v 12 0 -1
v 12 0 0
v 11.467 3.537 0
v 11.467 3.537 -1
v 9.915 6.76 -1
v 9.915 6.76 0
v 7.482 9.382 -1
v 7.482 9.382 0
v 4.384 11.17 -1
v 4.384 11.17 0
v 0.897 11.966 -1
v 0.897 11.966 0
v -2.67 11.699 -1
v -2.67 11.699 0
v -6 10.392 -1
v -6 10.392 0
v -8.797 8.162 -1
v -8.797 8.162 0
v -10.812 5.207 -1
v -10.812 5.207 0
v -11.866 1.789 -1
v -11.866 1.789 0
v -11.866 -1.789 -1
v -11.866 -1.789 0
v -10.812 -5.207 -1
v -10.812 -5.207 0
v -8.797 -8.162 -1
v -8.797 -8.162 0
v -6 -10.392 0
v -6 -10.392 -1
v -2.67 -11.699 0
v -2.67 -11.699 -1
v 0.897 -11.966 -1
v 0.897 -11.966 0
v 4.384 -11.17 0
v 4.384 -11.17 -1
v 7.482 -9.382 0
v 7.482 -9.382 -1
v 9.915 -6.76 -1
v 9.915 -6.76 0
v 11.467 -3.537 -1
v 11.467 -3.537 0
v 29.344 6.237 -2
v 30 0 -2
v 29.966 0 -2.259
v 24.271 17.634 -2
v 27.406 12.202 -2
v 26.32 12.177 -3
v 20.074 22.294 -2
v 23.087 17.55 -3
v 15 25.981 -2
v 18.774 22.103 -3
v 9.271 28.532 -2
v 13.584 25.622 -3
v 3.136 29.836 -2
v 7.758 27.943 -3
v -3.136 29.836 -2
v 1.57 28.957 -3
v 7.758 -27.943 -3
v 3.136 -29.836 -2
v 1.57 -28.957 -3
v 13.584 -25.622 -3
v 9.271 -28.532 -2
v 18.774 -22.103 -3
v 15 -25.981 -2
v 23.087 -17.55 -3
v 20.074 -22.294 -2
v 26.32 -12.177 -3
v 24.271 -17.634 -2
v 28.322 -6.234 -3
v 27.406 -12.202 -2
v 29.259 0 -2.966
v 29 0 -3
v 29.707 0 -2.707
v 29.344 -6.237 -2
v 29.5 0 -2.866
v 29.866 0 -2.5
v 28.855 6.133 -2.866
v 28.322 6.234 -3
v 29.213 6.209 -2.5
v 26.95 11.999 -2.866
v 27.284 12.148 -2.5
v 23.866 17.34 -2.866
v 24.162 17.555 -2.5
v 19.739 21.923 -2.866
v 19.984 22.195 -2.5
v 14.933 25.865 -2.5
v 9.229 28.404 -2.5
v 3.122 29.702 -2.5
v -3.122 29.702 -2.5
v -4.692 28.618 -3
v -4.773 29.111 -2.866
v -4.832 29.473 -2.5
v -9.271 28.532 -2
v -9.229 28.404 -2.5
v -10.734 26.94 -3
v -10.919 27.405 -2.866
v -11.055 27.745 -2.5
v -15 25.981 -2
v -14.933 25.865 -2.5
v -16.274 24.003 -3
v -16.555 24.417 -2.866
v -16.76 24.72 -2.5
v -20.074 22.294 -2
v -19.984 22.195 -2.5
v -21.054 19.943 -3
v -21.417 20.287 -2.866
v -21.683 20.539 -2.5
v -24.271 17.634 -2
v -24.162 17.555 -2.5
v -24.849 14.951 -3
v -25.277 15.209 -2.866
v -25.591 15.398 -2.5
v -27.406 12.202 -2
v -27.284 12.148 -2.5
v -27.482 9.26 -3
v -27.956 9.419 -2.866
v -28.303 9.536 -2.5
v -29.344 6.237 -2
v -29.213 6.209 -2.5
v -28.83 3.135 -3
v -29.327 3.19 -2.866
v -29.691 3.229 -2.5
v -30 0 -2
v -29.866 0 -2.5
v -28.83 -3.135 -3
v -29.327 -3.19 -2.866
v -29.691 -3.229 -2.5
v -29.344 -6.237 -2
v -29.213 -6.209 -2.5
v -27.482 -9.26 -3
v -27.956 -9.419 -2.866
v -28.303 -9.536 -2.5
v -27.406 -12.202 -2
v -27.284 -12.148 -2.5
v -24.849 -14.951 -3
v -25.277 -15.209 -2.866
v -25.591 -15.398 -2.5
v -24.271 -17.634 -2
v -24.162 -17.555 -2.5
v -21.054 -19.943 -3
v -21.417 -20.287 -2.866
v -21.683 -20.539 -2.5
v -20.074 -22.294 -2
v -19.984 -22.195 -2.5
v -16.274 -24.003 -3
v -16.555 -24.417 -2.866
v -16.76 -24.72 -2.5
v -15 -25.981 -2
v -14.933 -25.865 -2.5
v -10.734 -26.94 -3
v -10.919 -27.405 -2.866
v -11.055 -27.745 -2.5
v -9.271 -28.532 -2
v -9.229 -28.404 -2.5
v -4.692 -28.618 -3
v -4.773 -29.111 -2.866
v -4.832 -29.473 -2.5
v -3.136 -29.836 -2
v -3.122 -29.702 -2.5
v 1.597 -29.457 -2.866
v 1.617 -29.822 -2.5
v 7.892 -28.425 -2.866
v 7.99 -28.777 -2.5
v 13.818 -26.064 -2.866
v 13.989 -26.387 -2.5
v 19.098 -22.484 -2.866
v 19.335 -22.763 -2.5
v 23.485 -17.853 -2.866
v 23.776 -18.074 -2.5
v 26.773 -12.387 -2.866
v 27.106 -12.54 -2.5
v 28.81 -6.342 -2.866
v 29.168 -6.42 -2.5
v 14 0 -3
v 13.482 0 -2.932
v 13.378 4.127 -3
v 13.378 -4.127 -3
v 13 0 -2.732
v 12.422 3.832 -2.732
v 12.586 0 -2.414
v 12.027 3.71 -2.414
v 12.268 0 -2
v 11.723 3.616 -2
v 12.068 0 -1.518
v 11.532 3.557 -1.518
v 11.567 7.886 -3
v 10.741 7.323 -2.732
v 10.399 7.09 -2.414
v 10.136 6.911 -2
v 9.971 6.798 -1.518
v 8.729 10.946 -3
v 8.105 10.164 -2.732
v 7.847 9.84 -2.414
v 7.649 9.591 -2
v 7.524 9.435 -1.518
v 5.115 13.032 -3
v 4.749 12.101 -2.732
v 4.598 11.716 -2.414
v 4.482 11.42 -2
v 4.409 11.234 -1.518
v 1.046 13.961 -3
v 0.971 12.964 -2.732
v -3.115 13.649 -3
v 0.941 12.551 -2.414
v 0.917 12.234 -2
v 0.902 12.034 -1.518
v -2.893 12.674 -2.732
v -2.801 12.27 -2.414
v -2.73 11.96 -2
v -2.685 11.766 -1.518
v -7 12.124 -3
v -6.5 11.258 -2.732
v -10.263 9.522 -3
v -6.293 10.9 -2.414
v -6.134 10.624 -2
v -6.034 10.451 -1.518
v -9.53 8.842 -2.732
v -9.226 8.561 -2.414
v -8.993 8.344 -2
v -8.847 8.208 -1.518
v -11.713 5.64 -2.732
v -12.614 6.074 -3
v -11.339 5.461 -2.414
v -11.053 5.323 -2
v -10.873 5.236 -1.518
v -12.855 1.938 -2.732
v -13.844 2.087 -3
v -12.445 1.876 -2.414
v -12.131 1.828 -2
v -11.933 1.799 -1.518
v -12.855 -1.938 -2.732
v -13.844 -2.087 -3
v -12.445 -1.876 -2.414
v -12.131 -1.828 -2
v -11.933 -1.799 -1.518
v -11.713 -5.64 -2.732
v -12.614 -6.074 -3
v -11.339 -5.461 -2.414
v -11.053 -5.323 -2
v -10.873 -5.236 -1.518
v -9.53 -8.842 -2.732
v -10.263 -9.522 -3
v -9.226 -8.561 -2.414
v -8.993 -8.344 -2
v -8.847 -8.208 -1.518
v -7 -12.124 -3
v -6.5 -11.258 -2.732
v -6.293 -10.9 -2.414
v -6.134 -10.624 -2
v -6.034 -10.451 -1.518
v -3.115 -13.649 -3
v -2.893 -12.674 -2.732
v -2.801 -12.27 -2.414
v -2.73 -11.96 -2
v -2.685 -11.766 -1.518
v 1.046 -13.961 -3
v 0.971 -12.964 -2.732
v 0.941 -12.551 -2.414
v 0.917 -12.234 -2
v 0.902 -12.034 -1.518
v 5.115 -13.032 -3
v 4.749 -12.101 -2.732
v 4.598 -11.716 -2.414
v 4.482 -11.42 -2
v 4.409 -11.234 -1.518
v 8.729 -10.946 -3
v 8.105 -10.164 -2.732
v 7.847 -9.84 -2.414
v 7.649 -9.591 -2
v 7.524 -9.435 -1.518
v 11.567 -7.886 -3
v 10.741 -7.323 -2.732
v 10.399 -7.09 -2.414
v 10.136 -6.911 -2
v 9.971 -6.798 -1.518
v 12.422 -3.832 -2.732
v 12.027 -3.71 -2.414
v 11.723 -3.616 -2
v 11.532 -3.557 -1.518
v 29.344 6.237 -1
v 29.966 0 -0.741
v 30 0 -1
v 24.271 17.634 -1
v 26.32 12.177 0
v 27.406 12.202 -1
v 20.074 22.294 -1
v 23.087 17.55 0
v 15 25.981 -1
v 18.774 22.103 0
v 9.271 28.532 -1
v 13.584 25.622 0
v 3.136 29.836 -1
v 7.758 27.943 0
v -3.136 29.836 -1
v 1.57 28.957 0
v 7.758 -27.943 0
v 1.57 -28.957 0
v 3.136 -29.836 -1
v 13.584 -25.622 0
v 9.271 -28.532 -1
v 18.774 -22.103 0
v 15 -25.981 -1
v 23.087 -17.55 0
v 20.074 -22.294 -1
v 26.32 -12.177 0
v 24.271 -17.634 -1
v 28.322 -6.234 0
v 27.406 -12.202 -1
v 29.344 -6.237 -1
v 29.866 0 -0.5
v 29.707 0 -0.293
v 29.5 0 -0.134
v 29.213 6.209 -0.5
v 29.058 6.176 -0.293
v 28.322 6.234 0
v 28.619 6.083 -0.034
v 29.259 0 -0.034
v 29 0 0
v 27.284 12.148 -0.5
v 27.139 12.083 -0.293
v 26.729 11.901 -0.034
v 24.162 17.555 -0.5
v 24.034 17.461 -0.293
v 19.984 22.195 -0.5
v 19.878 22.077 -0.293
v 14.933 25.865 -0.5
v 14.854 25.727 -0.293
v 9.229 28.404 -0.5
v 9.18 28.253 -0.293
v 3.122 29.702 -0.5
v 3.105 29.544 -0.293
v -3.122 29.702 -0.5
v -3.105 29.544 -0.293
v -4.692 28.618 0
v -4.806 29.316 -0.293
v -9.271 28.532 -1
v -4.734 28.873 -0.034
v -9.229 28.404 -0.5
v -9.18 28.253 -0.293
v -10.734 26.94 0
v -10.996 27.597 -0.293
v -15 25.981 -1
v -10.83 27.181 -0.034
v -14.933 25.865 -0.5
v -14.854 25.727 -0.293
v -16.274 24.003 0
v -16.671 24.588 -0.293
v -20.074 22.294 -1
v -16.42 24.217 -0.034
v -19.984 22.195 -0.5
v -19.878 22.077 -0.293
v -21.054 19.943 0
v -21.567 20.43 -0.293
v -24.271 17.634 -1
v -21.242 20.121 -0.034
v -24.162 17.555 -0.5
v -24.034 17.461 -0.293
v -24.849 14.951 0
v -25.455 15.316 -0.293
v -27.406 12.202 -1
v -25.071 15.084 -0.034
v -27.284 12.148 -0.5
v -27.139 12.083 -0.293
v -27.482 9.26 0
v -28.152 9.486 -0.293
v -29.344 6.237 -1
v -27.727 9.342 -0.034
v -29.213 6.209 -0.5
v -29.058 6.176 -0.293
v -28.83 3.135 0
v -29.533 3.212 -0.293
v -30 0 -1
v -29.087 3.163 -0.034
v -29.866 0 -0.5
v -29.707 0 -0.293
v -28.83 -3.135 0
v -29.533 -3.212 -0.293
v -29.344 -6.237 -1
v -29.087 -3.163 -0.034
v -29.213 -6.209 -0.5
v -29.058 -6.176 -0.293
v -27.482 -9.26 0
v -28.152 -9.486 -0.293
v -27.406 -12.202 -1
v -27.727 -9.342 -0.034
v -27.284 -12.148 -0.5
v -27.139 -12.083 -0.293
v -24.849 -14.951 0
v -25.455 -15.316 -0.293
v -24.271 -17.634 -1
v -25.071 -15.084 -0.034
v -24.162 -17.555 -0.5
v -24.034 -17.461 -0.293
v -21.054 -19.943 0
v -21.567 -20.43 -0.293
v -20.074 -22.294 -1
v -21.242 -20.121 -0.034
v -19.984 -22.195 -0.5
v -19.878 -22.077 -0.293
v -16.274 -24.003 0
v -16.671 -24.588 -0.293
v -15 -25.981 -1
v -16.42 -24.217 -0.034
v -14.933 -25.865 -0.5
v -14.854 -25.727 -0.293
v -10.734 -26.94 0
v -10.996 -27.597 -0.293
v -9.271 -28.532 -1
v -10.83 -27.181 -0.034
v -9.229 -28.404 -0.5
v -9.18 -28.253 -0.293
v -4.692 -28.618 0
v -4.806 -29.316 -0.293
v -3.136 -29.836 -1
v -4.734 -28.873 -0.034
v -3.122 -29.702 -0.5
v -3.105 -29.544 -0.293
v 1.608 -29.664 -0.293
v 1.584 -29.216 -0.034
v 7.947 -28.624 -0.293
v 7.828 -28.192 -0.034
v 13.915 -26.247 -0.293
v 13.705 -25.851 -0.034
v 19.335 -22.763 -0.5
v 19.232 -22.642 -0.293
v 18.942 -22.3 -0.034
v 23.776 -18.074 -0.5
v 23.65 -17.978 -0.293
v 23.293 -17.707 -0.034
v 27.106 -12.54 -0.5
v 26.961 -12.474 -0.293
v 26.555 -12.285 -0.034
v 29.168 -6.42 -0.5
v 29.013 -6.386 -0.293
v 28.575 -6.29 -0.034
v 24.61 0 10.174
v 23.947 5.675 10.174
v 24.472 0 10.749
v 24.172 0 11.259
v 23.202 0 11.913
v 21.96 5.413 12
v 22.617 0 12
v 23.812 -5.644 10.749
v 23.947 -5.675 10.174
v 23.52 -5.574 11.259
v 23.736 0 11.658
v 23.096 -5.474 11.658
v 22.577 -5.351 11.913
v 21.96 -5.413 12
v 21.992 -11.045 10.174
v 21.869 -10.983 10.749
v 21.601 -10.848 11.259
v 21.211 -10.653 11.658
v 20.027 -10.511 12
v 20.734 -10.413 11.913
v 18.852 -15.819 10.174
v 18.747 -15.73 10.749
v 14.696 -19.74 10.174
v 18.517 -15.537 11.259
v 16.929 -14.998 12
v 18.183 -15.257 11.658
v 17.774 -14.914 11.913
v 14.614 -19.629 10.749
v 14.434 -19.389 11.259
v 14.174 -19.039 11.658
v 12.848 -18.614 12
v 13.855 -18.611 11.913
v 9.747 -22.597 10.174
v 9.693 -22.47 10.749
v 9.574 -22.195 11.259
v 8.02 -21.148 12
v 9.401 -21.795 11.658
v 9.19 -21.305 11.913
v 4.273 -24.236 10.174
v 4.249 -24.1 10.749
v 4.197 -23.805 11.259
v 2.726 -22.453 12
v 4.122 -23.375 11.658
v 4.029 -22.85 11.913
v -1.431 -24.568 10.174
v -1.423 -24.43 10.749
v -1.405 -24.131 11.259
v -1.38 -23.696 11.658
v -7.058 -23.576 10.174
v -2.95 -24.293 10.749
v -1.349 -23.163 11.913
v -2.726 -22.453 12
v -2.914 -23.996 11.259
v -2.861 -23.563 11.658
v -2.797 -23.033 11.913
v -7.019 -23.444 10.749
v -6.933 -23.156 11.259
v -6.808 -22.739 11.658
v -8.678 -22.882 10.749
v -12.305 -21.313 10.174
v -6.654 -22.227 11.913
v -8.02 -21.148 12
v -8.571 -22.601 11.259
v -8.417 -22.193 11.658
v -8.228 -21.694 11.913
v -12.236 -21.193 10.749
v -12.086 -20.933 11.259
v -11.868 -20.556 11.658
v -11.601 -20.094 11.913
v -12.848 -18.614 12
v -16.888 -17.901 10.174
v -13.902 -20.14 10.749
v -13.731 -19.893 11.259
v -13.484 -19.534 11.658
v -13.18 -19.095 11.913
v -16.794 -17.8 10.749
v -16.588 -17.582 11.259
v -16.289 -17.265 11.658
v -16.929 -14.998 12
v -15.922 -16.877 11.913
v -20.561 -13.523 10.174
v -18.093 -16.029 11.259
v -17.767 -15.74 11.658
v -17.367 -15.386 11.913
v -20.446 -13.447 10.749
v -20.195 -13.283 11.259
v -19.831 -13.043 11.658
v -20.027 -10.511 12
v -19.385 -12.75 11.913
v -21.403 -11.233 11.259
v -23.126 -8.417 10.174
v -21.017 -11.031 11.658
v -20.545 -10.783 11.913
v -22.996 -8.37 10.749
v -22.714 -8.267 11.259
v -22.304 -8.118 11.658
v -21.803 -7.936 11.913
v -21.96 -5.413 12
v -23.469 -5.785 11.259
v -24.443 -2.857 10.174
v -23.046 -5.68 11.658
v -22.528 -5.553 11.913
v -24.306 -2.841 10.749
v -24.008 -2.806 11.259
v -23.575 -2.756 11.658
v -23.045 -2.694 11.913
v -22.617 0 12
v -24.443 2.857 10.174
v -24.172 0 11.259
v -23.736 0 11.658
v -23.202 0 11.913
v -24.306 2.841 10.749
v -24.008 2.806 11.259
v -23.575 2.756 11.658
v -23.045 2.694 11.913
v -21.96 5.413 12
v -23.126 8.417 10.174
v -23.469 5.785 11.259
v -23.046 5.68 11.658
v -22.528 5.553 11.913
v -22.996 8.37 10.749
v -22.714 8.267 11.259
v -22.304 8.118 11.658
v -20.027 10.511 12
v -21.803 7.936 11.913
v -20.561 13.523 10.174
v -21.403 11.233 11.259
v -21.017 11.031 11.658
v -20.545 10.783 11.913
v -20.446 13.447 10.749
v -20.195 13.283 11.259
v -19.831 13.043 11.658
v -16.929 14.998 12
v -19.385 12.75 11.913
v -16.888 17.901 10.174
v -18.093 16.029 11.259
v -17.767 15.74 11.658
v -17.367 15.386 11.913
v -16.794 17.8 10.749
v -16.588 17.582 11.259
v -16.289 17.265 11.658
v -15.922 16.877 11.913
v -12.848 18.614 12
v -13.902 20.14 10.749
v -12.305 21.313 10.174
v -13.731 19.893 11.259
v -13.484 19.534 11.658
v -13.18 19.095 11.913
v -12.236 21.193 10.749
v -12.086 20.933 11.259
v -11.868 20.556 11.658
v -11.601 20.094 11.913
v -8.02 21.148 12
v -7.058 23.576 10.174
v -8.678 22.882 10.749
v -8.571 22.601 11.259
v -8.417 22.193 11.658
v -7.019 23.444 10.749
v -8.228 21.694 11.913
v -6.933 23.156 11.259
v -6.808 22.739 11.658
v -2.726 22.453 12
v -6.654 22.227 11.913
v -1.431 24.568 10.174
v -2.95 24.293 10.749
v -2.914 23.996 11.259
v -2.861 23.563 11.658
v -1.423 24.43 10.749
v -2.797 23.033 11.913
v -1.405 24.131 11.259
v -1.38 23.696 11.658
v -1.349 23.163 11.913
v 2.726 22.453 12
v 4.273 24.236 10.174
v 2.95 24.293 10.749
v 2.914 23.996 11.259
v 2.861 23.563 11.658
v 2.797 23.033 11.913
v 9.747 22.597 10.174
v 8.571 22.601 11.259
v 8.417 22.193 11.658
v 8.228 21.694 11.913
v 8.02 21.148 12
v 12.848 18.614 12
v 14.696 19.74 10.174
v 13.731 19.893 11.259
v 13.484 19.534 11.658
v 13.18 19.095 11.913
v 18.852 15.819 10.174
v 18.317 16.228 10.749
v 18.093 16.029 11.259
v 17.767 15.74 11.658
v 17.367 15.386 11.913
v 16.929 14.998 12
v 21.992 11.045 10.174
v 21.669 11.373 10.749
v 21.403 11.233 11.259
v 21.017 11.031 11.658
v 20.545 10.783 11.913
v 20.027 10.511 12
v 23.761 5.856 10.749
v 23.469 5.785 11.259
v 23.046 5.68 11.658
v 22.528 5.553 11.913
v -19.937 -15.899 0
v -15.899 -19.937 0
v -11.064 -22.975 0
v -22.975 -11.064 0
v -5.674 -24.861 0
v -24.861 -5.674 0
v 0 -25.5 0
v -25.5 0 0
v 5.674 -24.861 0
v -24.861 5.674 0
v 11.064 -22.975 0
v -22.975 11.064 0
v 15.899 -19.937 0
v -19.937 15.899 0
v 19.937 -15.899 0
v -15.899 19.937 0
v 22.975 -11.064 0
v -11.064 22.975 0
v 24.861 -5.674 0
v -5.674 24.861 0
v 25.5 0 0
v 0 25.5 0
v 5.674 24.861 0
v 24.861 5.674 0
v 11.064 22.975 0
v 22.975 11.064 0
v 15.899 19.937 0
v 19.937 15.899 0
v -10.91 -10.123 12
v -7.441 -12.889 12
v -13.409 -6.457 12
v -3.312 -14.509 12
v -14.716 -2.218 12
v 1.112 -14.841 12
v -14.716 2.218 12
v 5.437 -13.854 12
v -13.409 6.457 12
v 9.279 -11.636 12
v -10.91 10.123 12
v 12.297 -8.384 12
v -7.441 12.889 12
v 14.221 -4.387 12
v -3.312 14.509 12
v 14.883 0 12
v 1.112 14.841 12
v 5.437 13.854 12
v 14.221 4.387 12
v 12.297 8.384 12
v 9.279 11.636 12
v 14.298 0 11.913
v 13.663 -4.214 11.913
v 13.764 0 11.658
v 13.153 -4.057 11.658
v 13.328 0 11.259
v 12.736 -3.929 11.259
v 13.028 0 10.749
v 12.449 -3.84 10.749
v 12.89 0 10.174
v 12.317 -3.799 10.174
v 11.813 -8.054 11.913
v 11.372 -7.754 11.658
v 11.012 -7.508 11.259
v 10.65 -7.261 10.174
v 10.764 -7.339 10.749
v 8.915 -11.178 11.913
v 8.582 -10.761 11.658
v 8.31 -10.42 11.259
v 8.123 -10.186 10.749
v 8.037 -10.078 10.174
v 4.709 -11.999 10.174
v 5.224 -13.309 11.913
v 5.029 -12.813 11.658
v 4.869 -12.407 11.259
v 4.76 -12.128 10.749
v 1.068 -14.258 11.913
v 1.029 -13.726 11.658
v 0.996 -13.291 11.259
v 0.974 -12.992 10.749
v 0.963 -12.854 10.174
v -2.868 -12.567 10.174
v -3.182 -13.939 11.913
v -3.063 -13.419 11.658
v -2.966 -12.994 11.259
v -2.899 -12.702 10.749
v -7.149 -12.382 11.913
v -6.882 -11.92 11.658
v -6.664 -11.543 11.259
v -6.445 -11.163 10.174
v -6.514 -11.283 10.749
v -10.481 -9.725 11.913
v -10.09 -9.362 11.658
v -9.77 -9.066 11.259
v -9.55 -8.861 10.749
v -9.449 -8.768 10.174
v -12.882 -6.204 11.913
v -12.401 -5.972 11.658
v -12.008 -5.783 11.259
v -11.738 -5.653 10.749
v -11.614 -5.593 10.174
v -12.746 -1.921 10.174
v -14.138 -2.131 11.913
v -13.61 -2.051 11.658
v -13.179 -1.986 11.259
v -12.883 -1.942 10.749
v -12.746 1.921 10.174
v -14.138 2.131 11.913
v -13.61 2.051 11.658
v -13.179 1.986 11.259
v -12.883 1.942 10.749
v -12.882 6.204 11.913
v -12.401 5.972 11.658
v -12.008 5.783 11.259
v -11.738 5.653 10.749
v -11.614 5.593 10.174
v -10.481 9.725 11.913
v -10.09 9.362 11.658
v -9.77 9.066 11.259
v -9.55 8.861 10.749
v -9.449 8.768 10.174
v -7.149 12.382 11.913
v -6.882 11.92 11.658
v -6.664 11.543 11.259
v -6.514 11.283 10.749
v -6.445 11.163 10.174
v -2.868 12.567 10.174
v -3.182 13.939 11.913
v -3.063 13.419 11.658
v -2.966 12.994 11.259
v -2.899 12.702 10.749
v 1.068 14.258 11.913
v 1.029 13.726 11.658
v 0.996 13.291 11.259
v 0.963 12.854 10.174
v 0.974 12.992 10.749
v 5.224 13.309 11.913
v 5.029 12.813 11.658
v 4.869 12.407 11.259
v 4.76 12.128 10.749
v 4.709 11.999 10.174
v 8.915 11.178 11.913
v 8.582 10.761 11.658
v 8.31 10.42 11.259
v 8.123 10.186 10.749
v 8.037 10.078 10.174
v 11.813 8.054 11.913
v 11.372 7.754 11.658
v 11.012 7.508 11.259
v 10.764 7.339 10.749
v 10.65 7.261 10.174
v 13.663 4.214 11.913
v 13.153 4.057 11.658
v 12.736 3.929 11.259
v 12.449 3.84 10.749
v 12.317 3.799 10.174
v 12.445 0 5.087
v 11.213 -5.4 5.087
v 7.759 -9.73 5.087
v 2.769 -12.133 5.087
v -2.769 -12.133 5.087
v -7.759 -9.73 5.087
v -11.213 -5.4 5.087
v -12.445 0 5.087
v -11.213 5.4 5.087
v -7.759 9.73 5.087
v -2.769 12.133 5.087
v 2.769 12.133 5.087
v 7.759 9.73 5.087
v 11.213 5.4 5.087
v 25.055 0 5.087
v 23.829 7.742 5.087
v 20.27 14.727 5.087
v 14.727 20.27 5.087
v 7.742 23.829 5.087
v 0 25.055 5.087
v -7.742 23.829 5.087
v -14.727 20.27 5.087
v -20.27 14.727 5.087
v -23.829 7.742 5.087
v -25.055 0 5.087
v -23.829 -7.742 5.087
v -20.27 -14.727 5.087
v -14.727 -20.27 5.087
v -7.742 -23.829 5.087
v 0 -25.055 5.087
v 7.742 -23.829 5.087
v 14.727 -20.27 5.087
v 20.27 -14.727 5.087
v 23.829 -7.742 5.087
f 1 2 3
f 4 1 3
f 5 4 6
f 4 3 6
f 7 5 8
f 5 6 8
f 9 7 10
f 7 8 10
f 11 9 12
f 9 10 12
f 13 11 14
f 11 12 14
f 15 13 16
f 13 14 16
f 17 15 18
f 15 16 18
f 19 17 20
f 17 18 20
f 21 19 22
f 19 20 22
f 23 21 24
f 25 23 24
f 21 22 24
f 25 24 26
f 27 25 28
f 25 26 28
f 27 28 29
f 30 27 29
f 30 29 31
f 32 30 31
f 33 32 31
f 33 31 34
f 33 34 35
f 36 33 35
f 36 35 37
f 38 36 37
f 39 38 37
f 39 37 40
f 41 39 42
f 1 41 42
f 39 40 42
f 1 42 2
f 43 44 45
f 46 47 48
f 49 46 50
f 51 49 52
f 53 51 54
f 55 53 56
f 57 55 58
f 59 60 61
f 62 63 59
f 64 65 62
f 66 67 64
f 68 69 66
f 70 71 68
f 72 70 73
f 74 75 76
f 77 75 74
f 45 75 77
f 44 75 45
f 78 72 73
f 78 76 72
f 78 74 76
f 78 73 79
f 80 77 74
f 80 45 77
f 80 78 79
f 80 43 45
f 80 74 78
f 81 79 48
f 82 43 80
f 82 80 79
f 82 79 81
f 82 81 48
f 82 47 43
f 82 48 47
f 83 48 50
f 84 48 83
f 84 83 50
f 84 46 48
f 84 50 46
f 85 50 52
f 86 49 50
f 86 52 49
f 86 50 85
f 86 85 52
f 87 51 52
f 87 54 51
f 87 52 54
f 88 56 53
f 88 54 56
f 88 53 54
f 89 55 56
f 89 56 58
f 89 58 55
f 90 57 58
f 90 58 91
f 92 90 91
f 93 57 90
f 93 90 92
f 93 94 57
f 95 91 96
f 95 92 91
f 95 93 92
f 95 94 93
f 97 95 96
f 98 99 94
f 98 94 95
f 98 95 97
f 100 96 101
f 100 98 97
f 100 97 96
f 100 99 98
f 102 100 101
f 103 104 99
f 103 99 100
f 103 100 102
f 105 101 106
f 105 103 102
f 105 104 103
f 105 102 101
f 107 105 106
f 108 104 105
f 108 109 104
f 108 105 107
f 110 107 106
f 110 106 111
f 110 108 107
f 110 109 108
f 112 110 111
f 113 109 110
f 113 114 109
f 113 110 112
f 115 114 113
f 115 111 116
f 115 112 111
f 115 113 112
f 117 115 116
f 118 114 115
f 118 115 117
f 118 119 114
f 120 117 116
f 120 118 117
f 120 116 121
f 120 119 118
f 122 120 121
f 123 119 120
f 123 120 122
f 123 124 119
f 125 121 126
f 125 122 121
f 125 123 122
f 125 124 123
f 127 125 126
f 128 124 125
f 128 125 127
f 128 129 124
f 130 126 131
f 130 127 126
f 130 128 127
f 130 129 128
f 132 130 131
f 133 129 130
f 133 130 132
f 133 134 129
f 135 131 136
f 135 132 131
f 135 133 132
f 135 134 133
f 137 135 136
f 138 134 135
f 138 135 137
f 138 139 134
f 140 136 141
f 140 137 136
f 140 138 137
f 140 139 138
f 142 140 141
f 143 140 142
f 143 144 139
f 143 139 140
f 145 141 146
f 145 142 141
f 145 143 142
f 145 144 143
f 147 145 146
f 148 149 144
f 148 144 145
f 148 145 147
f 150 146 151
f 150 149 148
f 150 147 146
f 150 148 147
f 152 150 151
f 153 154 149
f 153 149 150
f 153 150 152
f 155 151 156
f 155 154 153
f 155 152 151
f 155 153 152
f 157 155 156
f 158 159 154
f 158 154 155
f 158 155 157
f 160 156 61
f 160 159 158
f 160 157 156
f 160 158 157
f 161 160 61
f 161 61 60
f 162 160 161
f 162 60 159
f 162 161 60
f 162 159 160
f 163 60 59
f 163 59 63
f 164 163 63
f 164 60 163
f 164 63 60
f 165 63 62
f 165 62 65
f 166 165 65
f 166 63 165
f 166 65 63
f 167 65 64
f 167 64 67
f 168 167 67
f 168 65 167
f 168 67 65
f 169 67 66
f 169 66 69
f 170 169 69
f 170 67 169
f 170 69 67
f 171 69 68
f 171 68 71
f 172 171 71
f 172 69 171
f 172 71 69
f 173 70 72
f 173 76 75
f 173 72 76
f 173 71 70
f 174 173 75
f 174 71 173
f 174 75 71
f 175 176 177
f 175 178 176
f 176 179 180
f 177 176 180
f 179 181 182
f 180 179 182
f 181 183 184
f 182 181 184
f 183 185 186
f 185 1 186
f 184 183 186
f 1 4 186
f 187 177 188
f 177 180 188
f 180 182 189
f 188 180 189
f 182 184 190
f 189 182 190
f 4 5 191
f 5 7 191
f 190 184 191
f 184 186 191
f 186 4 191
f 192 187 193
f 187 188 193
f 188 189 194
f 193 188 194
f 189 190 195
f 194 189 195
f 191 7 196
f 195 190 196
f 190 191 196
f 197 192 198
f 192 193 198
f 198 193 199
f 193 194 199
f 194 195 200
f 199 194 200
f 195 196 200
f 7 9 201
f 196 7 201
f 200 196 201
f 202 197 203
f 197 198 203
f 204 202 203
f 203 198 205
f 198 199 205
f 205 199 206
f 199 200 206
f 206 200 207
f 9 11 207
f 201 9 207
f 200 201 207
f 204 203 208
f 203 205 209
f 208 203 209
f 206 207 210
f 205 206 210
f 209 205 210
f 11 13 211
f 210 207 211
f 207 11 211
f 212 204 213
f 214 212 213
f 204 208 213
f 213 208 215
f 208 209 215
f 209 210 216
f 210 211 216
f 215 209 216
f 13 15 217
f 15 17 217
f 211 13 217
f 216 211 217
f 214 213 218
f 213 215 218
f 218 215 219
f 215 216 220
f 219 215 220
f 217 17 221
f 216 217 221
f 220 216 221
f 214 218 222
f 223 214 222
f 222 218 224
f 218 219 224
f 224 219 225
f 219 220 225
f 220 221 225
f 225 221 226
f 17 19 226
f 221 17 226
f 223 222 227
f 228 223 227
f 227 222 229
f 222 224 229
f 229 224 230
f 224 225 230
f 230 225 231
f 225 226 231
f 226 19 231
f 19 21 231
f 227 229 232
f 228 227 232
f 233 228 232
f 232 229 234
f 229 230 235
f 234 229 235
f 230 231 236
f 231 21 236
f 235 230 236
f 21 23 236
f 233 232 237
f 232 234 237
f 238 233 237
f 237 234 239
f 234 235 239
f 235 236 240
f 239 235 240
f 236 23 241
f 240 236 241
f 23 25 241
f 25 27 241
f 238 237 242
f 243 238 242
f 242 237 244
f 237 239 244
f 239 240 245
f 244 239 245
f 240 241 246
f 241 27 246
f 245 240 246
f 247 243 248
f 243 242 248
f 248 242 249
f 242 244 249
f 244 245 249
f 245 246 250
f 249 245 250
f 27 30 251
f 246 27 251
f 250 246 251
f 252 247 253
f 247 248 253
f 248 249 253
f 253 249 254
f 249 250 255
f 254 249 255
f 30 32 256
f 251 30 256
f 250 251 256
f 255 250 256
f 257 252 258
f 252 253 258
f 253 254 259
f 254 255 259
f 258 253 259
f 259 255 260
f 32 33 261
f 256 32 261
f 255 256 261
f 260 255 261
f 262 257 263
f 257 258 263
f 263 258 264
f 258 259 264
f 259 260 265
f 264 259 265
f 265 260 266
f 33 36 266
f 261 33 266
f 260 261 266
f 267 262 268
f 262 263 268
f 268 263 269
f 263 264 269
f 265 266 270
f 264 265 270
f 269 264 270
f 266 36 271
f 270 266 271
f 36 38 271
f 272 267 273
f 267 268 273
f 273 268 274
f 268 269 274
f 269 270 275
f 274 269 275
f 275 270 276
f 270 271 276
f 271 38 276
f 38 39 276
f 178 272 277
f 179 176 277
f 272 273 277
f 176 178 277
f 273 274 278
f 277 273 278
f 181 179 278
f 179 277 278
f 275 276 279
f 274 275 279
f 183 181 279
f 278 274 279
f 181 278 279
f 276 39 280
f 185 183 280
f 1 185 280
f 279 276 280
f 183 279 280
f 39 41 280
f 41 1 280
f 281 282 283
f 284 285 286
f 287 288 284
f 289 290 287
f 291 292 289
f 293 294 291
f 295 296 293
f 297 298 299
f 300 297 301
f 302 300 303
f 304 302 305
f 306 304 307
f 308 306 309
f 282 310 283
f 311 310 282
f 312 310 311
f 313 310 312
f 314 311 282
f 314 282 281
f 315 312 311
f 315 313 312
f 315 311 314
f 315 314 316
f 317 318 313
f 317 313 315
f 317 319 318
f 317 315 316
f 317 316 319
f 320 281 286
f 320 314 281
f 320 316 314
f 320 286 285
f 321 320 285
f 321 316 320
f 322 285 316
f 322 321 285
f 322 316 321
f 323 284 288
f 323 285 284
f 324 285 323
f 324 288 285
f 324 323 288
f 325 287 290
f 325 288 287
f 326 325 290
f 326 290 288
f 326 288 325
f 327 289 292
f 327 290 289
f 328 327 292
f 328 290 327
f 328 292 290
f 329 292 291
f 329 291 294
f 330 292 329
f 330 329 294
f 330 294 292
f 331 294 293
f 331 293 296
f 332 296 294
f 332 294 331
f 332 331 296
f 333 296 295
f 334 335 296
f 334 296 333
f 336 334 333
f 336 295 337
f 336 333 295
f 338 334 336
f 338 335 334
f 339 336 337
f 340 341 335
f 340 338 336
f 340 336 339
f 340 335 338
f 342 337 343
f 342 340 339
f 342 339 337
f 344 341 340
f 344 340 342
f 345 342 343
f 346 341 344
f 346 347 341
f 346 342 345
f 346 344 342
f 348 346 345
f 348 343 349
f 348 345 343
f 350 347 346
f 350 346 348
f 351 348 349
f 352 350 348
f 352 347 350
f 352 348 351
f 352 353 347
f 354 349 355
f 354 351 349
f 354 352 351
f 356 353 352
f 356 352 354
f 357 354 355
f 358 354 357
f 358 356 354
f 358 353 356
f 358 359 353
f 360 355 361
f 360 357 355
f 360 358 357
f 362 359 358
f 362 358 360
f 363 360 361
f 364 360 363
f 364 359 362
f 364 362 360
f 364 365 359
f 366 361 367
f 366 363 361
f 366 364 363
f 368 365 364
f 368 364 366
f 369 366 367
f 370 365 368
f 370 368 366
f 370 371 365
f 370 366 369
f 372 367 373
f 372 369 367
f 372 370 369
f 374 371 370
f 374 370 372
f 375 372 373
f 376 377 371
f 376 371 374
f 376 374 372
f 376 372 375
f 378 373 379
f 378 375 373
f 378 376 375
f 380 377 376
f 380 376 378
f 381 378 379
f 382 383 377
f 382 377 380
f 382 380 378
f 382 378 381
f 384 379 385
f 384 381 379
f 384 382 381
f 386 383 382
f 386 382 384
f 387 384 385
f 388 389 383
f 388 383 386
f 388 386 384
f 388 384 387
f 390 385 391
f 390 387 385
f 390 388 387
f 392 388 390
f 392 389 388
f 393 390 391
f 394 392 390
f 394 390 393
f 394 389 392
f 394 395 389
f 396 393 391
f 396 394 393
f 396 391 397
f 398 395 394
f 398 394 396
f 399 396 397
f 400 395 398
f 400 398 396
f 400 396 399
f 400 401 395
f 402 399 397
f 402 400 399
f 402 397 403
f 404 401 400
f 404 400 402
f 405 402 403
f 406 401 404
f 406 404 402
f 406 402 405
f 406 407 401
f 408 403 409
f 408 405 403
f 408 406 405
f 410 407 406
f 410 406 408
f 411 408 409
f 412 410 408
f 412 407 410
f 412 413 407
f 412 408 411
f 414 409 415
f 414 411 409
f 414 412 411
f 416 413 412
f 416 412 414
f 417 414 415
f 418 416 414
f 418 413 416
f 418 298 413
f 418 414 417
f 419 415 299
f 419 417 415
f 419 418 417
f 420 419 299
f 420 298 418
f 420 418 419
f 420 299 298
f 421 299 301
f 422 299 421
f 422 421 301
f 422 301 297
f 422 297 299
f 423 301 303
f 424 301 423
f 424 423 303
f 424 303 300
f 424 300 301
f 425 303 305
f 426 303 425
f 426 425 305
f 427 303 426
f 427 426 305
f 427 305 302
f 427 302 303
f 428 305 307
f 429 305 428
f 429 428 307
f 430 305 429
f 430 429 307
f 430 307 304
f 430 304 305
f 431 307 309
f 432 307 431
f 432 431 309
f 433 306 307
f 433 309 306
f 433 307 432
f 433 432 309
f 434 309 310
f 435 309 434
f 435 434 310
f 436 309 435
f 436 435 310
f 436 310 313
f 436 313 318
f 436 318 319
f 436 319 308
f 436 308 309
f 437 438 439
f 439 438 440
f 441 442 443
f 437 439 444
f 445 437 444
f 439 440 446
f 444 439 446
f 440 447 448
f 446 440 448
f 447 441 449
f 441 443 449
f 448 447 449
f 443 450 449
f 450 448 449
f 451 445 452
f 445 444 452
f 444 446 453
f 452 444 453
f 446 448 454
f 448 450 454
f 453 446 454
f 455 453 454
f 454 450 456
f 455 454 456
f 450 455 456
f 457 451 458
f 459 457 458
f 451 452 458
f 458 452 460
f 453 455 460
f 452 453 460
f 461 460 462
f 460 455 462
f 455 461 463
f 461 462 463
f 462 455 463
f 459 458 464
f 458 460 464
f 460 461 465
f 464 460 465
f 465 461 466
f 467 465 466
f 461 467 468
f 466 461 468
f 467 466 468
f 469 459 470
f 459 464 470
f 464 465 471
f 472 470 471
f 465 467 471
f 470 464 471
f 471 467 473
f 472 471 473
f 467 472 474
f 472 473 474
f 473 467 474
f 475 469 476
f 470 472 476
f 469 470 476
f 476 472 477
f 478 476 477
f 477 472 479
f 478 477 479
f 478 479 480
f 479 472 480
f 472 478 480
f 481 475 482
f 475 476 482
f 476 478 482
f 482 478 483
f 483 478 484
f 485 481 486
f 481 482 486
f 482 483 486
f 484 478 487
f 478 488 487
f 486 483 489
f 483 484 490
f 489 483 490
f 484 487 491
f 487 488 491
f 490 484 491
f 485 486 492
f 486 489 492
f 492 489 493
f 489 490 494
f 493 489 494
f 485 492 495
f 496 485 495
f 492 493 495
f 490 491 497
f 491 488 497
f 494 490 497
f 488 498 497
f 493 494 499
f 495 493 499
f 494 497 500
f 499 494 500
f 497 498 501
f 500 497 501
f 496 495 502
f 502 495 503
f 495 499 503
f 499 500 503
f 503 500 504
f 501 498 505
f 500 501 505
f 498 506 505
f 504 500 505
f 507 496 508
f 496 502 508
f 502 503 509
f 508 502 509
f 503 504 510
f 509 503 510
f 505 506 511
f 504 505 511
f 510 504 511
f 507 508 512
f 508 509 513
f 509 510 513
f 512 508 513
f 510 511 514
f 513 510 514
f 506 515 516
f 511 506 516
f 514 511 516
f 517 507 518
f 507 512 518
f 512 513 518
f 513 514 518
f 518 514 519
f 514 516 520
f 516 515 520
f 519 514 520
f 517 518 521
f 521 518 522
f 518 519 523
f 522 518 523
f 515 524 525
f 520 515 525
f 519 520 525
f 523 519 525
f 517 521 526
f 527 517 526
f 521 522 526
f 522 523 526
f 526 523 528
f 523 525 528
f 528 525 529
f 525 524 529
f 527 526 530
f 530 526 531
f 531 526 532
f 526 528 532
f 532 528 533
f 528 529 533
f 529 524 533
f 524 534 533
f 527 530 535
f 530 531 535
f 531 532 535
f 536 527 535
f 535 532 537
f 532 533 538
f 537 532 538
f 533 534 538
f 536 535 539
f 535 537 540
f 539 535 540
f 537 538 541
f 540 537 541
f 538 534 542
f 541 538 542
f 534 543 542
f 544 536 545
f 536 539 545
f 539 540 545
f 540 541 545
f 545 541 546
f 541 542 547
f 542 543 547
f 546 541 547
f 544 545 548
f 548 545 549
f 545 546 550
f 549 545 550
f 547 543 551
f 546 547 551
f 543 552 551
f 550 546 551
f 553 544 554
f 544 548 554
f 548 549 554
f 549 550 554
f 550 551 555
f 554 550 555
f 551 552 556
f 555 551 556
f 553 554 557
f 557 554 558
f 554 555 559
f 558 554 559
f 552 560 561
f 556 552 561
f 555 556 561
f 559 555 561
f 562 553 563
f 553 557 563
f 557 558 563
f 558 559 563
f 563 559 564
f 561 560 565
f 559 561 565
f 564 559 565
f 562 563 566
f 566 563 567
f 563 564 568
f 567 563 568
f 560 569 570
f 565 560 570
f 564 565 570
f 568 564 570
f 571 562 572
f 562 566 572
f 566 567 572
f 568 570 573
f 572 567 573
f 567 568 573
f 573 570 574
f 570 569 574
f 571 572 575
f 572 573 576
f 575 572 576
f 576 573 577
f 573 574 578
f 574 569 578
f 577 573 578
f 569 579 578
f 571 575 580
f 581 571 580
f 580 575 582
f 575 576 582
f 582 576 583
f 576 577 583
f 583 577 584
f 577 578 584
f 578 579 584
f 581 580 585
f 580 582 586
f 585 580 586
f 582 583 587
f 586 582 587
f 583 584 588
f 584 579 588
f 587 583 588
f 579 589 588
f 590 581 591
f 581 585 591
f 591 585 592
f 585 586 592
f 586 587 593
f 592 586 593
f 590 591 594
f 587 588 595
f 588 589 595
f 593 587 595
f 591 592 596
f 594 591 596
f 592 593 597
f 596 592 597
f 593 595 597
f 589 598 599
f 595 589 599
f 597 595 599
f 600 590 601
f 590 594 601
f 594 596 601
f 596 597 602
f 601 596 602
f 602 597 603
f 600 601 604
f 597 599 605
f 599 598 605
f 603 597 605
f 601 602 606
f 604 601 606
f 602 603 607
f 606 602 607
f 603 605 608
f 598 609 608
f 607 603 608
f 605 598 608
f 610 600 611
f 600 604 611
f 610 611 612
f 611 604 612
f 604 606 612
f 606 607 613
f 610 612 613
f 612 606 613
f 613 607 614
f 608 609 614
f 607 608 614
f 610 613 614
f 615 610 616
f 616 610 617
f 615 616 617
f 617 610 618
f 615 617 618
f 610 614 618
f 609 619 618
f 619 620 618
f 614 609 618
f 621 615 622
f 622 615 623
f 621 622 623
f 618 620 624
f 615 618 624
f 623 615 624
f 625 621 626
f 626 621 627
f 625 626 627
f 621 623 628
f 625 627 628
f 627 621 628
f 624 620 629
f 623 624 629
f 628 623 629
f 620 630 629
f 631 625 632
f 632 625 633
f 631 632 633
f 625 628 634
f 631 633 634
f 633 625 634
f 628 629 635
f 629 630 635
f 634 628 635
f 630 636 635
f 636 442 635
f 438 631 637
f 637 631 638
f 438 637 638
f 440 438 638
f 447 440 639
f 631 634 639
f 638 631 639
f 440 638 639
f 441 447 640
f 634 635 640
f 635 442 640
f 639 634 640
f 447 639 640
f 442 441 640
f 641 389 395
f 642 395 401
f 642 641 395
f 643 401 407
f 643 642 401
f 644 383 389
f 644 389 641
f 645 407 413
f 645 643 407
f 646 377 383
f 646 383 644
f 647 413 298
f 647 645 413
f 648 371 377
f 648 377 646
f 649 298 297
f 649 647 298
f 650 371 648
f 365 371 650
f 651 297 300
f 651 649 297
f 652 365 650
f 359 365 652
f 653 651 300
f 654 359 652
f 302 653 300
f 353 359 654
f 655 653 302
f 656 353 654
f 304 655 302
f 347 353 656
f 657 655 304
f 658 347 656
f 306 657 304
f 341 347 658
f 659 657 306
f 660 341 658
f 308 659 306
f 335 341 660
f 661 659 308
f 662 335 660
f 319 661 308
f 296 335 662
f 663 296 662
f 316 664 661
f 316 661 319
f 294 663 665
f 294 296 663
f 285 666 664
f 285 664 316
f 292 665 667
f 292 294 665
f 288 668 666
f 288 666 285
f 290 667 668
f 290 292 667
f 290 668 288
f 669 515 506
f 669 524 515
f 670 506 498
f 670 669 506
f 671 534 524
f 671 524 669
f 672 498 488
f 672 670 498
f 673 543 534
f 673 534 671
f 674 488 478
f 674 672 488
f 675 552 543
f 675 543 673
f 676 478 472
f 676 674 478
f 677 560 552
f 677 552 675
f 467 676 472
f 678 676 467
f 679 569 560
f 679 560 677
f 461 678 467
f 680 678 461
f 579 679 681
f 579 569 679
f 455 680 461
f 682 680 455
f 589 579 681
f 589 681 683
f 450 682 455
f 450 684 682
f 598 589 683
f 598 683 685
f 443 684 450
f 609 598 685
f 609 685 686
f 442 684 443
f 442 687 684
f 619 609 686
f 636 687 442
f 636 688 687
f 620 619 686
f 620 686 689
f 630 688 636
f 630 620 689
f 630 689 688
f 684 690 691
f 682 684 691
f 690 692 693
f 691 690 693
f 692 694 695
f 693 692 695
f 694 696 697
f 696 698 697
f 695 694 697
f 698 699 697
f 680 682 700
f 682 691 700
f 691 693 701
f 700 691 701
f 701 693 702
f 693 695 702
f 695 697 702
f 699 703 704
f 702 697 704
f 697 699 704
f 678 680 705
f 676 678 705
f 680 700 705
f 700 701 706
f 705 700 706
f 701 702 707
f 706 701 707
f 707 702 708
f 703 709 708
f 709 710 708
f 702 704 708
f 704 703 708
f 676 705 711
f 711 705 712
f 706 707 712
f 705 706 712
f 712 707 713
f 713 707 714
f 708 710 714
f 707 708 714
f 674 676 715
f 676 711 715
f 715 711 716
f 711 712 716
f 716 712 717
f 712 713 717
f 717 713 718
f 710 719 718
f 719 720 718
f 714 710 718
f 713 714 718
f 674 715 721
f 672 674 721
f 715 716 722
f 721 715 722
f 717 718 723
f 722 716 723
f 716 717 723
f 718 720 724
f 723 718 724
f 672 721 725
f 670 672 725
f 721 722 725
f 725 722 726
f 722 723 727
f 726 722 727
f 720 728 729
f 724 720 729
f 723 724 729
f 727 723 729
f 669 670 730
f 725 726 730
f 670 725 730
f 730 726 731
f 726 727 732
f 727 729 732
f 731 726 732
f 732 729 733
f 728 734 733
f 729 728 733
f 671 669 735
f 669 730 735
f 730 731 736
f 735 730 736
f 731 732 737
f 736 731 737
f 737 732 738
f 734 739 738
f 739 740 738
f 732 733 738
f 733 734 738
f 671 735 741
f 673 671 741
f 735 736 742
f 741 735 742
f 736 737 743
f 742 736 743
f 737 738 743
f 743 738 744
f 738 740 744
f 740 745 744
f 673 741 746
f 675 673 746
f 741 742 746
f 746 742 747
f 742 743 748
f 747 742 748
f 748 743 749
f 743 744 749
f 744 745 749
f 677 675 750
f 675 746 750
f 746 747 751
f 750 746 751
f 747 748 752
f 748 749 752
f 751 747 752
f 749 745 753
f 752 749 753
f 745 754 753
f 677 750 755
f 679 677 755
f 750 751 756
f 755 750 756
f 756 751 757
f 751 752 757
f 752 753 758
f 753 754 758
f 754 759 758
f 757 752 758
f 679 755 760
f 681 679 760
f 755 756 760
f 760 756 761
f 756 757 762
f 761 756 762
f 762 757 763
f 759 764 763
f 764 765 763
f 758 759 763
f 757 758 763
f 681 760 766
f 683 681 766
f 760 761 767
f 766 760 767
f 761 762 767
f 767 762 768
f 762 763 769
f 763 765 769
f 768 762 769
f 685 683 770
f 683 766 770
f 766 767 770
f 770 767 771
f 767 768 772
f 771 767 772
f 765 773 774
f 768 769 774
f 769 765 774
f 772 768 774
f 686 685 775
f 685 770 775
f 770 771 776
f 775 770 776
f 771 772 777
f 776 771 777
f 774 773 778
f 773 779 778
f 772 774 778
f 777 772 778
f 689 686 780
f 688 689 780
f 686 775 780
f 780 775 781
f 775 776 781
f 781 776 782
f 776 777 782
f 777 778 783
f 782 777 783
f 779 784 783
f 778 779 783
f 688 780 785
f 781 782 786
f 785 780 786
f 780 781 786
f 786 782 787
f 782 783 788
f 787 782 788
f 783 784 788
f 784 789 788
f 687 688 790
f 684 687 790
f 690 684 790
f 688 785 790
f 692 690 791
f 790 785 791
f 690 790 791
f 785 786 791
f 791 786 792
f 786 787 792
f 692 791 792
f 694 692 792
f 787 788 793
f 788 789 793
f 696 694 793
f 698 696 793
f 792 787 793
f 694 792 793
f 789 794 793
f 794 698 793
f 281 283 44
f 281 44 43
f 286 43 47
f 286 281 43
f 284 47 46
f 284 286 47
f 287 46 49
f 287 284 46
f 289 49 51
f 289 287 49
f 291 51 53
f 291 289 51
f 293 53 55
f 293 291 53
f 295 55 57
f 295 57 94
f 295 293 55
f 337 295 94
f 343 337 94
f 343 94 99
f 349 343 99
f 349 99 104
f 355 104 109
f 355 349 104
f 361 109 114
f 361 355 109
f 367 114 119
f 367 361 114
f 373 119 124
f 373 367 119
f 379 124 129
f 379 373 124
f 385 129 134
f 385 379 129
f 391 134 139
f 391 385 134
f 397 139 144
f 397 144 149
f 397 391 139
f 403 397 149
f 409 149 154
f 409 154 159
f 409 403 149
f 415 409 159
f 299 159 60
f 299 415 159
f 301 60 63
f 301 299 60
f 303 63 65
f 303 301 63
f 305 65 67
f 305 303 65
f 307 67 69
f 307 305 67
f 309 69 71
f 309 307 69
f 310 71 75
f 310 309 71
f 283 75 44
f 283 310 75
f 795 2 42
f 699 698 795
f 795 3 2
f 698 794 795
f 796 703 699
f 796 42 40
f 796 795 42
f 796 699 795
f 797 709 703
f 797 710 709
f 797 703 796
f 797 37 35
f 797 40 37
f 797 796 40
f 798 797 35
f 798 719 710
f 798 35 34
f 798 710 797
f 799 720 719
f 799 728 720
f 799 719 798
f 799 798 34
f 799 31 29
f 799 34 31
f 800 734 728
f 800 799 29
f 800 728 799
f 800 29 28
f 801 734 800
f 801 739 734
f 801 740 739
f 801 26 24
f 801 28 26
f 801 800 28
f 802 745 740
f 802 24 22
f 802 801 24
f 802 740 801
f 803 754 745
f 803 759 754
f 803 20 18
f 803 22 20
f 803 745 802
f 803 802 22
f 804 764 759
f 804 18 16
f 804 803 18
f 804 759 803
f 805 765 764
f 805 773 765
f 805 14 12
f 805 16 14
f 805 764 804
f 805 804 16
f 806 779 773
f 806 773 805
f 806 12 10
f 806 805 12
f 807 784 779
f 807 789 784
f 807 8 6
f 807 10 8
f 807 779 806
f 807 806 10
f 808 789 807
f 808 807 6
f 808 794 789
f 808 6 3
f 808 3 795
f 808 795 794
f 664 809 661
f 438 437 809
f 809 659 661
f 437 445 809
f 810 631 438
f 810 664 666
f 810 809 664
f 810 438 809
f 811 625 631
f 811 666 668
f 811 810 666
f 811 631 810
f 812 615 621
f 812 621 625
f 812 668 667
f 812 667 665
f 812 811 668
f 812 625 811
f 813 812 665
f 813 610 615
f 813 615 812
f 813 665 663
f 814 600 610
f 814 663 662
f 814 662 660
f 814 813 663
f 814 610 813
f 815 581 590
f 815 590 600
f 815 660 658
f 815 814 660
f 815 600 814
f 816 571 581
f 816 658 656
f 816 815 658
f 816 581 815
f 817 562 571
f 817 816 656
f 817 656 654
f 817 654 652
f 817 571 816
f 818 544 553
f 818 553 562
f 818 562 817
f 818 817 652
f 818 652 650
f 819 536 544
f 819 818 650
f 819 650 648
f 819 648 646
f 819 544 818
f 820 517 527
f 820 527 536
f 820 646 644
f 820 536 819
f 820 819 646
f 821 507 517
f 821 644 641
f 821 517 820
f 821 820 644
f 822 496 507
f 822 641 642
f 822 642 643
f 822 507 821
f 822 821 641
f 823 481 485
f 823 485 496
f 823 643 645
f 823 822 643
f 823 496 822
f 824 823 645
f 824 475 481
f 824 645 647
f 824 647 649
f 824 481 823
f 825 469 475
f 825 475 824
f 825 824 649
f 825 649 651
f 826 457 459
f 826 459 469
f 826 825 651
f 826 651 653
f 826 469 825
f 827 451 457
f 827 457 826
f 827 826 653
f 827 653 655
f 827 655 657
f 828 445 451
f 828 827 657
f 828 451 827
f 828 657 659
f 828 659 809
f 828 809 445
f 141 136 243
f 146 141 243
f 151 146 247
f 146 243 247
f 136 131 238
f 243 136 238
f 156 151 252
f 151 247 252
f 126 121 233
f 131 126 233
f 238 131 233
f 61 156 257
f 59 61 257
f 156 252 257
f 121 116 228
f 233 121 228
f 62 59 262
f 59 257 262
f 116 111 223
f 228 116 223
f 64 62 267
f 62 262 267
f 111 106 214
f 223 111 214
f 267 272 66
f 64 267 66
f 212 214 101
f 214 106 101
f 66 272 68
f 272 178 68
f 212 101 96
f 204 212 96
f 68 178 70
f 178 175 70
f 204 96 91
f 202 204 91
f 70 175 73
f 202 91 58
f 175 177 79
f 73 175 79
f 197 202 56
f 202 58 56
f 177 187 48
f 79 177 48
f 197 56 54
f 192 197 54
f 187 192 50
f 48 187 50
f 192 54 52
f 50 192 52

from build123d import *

# Parameters (mm, degrees)
F0_R     = 25.5
F0_R_2   = 12
F1_DEPTH = 12
F1_TAPER = 5
F2_R     = 30
F2_R_2   = 12
F3_DEPTH = 3
F4_R     = 2
F5_R     = 1


with BuildPart() as f1:
    # F0 (on Top) → F1 (new body)
    with BuildSketch(Plane.XY):
        Circle(F0_R)
        Circle(F0_R_2, mode=Mode.SUBTRACT)
    extrude(amount=F1_DEPTH, taper=F1_TAPER)

    # F2 (on Top) → F3 (join)
    with BuildSketch(Plane.XY):
        Circle(F2_R)
        Circle(F2_R_2, mode=Mode.SUBTRACT)
    extrude(amount=-F3_DEPTH)

    # F4
    f4_edges = [f1.edges().sort_by_distance(p)[0] for p in [
        (-24.450136, 0, 12),
        (-12, 0, -3),
        (-13.049864, 0, 12),
    ]]
    fillet(f4_edges, radius=F4_R)

    # F5
    f5_edges = [f1.edges().sort_by_distance(p)[0] for p in [
        (-30, 0, -3),
        (-30, 0, 0),
    ]]
    fillet(f5_edges, radius=F5_R)


solid = f1.part
